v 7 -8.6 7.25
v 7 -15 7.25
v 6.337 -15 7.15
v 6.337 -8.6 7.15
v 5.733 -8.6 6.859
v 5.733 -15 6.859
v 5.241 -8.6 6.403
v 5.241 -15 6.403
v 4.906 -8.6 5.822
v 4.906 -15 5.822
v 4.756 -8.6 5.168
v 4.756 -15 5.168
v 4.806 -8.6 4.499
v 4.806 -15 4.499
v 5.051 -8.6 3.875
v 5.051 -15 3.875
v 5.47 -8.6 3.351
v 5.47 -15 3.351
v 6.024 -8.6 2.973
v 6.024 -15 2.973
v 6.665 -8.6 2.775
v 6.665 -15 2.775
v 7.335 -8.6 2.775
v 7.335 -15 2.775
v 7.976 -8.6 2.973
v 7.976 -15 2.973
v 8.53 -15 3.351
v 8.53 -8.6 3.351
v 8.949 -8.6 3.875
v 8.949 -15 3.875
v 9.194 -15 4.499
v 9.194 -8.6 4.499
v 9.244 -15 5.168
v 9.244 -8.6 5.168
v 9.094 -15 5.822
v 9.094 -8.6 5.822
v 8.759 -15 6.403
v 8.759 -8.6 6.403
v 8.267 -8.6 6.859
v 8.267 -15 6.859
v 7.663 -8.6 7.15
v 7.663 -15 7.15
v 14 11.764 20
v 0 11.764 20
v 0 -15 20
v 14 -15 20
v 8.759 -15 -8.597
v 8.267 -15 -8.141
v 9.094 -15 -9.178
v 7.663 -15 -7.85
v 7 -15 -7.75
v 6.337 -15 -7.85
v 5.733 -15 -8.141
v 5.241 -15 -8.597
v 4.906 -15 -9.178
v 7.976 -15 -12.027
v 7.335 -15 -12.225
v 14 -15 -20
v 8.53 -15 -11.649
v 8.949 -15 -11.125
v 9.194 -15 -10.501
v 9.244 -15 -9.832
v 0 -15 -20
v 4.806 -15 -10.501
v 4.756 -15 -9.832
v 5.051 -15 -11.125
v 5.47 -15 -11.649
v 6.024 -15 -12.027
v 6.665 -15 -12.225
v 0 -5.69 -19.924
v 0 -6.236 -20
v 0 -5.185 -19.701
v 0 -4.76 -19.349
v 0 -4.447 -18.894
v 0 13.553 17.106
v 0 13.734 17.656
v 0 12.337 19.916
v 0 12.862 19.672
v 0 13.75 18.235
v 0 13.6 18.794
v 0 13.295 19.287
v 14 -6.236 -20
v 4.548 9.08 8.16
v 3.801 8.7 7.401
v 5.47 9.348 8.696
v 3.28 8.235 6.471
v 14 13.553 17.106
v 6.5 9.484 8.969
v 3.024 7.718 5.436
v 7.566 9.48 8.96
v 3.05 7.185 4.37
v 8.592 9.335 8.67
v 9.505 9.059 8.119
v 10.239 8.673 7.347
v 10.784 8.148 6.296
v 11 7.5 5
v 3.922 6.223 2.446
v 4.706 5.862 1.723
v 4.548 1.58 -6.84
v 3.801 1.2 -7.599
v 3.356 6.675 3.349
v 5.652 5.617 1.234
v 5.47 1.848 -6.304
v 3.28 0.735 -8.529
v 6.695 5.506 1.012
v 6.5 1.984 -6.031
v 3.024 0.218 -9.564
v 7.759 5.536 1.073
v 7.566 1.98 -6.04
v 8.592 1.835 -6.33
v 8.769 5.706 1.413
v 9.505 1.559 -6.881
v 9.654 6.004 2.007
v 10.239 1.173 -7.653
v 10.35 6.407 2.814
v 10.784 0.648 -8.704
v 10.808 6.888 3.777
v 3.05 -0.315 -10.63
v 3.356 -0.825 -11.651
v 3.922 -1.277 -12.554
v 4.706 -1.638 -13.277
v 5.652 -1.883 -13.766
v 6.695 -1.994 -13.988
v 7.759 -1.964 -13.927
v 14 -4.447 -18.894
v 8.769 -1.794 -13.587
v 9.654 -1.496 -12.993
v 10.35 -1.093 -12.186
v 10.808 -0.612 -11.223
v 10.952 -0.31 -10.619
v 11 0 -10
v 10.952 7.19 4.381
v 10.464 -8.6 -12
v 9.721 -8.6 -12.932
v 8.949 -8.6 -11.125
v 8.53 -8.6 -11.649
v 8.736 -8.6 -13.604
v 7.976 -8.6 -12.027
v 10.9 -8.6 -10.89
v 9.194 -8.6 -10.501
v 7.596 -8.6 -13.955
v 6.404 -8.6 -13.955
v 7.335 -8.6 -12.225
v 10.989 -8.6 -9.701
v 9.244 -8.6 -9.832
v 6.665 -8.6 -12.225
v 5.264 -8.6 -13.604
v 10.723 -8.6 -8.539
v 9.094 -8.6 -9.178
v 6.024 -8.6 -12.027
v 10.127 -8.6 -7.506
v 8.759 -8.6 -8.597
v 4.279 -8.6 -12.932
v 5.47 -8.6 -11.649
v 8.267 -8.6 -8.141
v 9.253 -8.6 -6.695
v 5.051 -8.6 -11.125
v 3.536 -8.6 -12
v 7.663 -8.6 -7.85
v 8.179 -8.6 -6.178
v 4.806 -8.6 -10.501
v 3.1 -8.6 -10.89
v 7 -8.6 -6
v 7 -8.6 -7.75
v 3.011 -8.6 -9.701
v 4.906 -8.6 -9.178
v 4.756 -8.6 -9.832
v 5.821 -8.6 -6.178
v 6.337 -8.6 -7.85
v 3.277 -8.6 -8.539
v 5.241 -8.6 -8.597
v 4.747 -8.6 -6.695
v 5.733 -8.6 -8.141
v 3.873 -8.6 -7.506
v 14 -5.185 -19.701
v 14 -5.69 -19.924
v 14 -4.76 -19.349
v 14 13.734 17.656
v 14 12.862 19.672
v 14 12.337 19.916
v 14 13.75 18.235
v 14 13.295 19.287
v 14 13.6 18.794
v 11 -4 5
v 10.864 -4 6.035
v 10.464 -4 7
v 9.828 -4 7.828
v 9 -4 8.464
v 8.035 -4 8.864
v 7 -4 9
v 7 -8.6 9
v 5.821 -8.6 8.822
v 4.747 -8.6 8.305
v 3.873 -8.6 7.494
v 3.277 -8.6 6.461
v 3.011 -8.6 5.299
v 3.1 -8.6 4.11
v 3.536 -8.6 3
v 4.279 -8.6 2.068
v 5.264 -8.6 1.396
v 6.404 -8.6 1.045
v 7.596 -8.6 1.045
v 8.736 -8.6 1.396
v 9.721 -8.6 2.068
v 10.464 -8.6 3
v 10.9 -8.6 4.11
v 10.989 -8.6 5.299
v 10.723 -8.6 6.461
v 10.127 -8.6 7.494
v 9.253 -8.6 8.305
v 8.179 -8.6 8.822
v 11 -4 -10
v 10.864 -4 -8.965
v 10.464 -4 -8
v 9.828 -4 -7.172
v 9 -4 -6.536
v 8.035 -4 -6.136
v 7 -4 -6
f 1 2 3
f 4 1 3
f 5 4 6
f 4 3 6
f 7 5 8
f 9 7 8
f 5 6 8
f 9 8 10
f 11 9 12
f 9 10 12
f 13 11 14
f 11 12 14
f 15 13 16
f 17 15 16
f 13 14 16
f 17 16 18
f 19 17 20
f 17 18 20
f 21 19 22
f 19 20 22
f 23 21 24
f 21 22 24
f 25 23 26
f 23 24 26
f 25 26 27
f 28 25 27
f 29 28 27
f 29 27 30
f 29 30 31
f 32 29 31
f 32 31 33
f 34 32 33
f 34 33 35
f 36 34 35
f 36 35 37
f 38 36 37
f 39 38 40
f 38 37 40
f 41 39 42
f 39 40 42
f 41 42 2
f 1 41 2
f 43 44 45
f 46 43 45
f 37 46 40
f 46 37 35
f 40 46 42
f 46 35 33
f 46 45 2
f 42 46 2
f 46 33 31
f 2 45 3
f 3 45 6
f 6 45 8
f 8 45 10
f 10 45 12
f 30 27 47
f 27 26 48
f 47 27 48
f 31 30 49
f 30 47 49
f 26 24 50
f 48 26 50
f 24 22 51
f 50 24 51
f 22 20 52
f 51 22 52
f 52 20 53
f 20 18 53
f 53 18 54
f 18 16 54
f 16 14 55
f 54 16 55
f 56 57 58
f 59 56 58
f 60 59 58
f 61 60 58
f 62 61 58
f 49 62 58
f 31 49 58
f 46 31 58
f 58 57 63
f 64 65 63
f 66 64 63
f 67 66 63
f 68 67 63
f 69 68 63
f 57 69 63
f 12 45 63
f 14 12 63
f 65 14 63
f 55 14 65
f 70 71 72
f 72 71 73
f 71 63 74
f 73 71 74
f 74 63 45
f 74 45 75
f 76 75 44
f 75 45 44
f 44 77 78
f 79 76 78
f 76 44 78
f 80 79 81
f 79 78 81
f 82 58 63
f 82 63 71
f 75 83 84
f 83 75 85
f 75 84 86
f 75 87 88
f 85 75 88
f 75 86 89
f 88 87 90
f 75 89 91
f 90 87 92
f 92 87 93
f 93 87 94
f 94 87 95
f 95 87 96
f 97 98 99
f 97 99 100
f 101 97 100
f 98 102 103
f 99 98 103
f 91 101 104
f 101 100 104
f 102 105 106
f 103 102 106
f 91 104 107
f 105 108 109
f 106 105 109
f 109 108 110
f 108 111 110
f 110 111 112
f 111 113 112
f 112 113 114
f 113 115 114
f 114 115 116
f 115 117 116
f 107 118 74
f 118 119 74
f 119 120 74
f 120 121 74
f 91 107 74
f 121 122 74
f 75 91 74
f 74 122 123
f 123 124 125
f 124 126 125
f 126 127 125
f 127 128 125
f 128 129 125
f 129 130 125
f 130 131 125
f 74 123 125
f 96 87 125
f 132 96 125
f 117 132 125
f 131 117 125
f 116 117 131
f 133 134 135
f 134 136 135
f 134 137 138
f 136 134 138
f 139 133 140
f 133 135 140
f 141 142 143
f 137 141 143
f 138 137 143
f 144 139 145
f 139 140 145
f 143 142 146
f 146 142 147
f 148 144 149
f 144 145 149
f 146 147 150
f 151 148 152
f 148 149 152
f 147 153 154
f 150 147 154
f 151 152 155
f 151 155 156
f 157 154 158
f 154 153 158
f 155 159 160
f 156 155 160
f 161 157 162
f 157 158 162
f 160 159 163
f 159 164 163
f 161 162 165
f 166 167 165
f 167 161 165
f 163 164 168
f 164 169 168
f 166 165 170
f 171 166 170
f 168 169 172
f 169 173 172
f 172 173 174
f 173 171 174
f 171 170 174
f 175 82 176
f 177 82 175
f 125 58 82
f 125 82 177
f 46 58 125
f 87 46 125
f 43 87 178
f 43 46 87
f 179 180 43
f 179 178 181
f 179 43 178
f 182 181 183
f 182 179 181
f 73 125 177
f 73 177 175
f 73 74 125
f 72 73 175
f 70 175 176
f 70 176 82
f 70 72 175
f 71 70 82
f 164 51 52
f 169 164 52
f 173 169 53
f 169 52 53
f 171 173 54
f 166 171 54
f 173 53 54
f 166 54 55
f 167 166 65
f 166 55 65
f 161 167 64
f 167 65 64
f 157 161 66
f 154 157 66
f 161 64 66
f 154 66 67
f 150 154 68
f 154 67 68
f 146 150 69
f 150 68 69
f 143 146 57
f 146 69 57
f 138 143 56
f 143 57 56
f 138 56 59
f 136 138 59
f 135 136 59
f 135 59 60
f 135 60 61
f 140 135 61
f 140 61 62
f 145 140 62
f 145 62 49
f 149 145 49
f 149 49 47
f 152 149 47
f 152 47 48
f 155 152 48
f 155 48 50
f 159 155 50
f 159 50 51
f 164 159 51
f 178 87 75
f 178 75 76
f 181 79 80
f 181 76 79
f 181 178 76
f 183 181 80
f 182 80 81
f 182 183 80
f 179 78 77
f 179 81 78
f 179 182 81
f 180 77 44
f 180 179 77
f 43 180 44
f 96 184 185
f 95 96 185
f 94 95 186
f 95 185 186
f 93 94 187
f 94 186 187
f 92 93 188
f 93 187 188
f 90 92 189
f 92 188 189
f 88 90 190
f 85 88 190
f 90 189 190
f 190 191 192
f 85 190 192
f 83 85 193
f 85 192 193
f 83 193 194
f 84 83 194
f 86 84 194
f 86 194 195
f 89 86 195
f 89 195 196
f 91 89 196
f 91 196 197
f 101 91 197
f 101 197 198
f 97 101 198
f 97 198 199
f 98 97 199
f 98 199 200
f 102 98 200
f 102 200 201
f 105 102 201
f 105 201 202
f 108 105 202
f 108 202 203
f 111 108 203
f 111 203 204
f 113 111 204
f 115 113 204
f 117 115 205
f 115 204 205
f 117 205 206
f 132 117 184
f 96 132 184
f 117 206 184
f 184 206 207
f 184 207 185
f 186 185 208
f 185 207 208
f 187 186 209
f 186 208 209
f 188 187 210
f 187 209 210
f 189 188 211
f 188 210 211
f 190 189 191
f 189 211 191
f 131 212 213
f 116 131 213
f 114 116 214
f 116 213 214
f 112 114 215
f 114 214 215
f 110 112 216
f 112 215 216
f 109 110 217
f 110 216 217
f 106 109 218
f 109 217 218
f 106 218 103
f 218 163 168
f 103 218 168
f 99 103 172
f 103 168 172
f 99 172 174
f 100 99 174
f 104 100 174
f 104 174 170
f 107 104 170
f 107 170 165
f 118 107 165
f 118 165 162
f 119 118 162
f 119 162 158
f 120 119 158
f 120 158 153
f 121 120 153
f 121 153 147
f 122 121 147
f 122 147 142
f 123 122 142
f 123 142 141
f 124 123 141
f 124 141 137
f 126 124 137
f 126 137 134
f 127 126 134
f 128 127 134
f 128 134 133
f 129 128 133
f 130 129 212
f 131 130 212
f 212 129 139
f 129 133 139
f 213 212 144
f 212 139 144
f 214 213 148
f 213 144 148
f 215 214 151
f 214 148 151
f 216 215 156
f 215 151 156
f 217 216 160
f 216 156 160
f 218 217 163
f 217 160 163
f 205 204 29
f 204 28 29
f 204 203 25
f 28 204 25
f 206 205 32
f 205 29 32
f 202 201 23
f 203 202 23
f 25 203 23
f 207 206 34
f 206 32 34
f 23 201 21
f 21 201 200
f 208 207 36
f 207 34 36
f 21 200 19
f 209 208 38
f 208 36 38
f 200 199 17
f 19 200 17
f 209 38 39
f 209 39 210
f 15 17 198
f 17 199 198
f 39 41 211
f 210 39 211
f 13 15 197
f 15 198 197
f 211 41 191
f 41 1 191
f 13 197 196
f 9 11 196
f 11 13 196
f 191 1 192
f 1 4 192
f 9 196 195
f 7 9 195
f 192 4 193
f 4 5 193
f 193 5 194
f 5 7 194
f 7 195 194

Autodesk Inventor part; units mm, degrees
ref_plane "YZ Plane" through (0, 0, 0) normal (1, 0, 0) x (0, 1, 0)
ref_plane "XZ Plane" through (0, 0, 0) normal (0, 1, 0) x (-1, 0, 0)
sketch "Sketch1" plane through (0, 0, 0) normal (1, 0, 0) x (0, 1, 0)
  line L0 (15, 20) -> (-15, 20)
  line L1 (-15, 20) -> (-15, -20)
  line L2 (-15, -20) -> (15, -20)
  line L3 (15, -20) -> (15, 20)
  line L4 (15, 20) -> (-15, -20) construction
  line L5 (-15, 20) -> (15, -20) construction
  point P0 (0, 0)
  dimension "d0" = 30
  dimension "d1" = 40
extrude "Extrusion1" add sketch "Sketch1" along normal blind 14
sketch "Sketch2" plane through (14, 0, 0) normal (1, 0, 0) x (0, 0, -1)
  line L0 (-20, -15) -> (20, -15) projected
  line L1 (20, -15) -> (20, 15) projected
  line L2 (20, 15) -> (-20, 15) projected
  line L3 (-20, 15) -> (-20, -15) projected
  line L4 (-20, 15) -> (20, -5)
  point P0 (0, 0)
  dimension "d4" = 10
extrude "Extrusion2" cut sketch "Sketch2" against normal through all contours L2 L1 L4
fillet "Fillet1" radius 2 2 edges at (7, 15, 20) (7, -5, -20)
ref_plane "Work Plane1" through (0, -4, -20) normal (0, -1, 0) x (1, 0, 0)
sketch "Sketch3" plane through (0, -4, -20) normal (0, -1, 0) x (1, 0, 0)
  line L0 (0, 40) -> (14, 40) projected
  line L1 (0, 40) -> (14, 40) projected
  line L2 (14, 0) -> (0, 0) projected
  line L3 (0, 0) -> (14, 0) projected
  point P0 (0, 20)
  point P1 (7, 10)
  point P2 (7, 25)
  point P3 (7, 40)
  dimension "d9" = 15
  dimension "d10" = 10
hole "Hole1" at (7, -4, -10) at (7, -4, 5) direction (0, -1, 0) diameter 4.5 end through all counterbore diameter 8 counterbore depth 4.6 clearance for "Socket Head Cap Screw ISO 4762" size "M4" standard "ISO"
sketch "Sketch4" plane through (0, -4, -20) normal (0, -1, 0) x (1, 0, 0)
  circle A0 centre (7, 10) radius 4 projected
  circle A1 centre (7, 10) radius 4 projected
  circle A2 centre (7, 25) radius 4 projected
  circle A3 centre (7, 25) radius 4 projected
  point P0 (0, 20)
extrude "Extrusion3" cut sketch "Sketch4" against normal through all
properties part number "blokada_hiwin_3DPrint"
